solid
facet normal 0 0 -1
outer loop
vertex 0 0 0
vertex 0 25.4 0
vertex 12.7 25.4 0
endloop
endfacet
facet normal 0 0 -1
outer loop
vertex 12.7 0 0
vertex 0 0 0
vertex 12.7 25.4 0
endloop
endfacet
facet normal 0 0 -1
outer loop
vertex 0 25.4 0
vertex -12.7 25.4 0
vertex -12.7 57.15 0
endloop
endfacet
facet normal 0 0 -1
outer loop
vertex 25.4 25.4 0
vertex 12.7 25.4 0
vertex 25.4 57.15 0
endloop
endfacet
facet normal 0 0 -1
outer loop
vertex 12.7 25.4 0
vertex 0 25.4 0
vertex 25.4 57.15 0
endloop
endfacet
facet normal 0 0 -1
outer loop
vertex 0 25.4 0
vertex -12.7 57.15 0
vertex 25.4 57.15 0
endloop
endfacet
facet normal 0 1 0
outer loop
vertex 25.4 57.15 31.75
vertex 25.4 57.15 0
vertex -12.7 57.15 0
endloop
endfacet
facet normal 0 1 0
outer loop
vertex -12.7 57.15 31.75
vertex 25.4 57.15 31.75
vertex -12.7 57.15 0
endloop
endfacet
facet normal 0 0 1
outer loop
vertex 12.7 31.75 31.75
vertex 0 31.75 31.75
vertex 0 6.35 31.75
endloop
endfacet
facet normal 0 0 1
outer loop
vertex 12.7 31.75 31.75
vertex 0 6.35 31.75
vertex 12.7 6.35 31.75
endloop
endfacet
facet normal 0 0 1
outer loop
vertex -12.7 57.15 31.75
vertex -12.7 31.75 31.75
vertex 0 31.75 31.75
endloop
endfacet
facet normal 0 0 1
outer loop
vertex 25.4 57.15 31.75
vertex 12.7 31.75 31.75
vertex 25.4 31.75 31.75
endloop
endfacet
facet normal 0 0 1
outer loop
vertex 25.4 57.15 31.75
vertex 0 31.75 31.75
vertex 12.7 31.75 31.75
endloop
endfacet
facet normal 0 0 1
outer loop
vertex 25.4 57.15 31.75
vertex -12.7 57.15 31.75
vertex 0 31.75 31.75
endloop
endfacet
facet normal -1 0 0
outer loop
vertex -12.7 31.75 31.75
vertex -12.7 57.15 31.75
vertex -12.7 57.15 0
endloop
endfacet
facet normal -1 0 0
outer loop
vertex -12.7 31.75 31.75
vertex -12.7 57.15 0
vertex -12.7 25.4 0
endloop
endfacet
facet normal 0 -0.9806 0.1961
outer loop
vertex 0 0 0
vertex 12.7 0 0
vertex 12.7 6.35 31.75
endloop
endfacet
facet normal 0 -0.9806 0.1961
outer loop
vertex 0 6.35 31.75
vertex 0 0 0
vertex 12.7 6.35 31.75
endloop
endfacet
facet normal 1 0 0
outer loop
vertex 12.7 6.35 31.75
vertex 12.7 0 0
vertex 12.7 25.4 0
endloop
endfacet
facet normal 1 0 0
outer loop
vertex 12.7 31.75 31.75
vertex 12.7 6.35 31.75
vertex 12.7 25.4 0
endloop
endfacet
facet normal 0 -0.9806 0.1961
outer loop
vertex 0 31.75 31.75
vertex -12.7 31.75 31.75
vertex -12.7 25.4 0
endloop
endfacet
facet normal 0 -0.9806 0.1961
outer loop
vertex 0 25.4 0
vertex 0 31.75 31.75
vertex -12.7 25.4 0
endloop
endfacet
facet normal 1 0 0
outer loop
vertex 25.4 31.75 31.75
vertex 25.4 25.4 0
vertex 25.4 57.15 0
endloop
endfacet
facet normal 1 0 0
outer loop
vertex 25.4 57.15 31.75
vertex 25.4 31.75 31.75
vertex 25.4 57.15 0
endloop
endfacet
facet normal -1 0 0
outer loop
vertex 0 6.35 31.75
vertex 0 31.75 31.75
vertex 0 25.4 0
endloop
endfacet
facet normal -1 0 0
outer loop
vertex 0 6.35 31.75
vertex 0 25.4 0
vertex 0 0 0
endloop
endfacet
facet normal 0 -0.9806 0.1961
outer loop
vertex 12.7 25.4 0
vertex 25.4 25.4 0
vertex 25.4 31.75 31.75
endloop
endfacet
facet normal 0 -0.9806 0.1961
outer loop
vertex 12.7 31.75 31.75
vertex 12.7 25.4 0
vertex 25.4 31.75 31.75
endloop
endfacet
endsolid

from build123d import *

# Parameters (mm, degrees)
F1_DEPTH = 31.75
F3_DEPTH = 12.7
F5_DEPTH = 12.7
F7_DEPTH = 12.7


with BuildPart() as f1:
    # F0 (on Top) → F1 (new body)
    with BuildSketch(Plane.XY):
        Polygon((0, 25.4), (0, 0), (12.7, 0), (12.7, 25.4), (25.4, 25.4), (25.4, 57.15), (-12.7, 57.15), (-12.7, 25.4), align=None)
    extrude(amount=F1_DEPTH)

    # F2 (on face) → F3 (cut)
    with BuildSketch(Plane(origin=(-12.7, 0, 0), x_dir=(0, -1, 0), z_dir=(-1, 0, 0))):
        Polygon((-31.75, 31.75), (-25.4, 0), (-25.4, 31.75), align=None)
    extrude(amount=-F3_DEPTH, mode=Mode.SUBTRACT)

    # F4 (on face) → F5 (cut)
    with BuildSketch(Plane.YZ.offset(25.4)):
        Polygon((25.4, 31.75), (25.4, 0), (31.75, 31.75), align=None)
    extrude(amount=-F5_DEPTH, mode=Mode.SUBTRACT)

    # F6 (on face) → F7 (cut)
    with BuildSketch(Plane.YZ.offset(12.7)):
        Polygon((0, 31.75), (0, 0), (6.35, 31.75), align=None)
    extrude(amount=-F7_DEPTH, mode=Mode.SUBTRACT)


solid = f1.part
